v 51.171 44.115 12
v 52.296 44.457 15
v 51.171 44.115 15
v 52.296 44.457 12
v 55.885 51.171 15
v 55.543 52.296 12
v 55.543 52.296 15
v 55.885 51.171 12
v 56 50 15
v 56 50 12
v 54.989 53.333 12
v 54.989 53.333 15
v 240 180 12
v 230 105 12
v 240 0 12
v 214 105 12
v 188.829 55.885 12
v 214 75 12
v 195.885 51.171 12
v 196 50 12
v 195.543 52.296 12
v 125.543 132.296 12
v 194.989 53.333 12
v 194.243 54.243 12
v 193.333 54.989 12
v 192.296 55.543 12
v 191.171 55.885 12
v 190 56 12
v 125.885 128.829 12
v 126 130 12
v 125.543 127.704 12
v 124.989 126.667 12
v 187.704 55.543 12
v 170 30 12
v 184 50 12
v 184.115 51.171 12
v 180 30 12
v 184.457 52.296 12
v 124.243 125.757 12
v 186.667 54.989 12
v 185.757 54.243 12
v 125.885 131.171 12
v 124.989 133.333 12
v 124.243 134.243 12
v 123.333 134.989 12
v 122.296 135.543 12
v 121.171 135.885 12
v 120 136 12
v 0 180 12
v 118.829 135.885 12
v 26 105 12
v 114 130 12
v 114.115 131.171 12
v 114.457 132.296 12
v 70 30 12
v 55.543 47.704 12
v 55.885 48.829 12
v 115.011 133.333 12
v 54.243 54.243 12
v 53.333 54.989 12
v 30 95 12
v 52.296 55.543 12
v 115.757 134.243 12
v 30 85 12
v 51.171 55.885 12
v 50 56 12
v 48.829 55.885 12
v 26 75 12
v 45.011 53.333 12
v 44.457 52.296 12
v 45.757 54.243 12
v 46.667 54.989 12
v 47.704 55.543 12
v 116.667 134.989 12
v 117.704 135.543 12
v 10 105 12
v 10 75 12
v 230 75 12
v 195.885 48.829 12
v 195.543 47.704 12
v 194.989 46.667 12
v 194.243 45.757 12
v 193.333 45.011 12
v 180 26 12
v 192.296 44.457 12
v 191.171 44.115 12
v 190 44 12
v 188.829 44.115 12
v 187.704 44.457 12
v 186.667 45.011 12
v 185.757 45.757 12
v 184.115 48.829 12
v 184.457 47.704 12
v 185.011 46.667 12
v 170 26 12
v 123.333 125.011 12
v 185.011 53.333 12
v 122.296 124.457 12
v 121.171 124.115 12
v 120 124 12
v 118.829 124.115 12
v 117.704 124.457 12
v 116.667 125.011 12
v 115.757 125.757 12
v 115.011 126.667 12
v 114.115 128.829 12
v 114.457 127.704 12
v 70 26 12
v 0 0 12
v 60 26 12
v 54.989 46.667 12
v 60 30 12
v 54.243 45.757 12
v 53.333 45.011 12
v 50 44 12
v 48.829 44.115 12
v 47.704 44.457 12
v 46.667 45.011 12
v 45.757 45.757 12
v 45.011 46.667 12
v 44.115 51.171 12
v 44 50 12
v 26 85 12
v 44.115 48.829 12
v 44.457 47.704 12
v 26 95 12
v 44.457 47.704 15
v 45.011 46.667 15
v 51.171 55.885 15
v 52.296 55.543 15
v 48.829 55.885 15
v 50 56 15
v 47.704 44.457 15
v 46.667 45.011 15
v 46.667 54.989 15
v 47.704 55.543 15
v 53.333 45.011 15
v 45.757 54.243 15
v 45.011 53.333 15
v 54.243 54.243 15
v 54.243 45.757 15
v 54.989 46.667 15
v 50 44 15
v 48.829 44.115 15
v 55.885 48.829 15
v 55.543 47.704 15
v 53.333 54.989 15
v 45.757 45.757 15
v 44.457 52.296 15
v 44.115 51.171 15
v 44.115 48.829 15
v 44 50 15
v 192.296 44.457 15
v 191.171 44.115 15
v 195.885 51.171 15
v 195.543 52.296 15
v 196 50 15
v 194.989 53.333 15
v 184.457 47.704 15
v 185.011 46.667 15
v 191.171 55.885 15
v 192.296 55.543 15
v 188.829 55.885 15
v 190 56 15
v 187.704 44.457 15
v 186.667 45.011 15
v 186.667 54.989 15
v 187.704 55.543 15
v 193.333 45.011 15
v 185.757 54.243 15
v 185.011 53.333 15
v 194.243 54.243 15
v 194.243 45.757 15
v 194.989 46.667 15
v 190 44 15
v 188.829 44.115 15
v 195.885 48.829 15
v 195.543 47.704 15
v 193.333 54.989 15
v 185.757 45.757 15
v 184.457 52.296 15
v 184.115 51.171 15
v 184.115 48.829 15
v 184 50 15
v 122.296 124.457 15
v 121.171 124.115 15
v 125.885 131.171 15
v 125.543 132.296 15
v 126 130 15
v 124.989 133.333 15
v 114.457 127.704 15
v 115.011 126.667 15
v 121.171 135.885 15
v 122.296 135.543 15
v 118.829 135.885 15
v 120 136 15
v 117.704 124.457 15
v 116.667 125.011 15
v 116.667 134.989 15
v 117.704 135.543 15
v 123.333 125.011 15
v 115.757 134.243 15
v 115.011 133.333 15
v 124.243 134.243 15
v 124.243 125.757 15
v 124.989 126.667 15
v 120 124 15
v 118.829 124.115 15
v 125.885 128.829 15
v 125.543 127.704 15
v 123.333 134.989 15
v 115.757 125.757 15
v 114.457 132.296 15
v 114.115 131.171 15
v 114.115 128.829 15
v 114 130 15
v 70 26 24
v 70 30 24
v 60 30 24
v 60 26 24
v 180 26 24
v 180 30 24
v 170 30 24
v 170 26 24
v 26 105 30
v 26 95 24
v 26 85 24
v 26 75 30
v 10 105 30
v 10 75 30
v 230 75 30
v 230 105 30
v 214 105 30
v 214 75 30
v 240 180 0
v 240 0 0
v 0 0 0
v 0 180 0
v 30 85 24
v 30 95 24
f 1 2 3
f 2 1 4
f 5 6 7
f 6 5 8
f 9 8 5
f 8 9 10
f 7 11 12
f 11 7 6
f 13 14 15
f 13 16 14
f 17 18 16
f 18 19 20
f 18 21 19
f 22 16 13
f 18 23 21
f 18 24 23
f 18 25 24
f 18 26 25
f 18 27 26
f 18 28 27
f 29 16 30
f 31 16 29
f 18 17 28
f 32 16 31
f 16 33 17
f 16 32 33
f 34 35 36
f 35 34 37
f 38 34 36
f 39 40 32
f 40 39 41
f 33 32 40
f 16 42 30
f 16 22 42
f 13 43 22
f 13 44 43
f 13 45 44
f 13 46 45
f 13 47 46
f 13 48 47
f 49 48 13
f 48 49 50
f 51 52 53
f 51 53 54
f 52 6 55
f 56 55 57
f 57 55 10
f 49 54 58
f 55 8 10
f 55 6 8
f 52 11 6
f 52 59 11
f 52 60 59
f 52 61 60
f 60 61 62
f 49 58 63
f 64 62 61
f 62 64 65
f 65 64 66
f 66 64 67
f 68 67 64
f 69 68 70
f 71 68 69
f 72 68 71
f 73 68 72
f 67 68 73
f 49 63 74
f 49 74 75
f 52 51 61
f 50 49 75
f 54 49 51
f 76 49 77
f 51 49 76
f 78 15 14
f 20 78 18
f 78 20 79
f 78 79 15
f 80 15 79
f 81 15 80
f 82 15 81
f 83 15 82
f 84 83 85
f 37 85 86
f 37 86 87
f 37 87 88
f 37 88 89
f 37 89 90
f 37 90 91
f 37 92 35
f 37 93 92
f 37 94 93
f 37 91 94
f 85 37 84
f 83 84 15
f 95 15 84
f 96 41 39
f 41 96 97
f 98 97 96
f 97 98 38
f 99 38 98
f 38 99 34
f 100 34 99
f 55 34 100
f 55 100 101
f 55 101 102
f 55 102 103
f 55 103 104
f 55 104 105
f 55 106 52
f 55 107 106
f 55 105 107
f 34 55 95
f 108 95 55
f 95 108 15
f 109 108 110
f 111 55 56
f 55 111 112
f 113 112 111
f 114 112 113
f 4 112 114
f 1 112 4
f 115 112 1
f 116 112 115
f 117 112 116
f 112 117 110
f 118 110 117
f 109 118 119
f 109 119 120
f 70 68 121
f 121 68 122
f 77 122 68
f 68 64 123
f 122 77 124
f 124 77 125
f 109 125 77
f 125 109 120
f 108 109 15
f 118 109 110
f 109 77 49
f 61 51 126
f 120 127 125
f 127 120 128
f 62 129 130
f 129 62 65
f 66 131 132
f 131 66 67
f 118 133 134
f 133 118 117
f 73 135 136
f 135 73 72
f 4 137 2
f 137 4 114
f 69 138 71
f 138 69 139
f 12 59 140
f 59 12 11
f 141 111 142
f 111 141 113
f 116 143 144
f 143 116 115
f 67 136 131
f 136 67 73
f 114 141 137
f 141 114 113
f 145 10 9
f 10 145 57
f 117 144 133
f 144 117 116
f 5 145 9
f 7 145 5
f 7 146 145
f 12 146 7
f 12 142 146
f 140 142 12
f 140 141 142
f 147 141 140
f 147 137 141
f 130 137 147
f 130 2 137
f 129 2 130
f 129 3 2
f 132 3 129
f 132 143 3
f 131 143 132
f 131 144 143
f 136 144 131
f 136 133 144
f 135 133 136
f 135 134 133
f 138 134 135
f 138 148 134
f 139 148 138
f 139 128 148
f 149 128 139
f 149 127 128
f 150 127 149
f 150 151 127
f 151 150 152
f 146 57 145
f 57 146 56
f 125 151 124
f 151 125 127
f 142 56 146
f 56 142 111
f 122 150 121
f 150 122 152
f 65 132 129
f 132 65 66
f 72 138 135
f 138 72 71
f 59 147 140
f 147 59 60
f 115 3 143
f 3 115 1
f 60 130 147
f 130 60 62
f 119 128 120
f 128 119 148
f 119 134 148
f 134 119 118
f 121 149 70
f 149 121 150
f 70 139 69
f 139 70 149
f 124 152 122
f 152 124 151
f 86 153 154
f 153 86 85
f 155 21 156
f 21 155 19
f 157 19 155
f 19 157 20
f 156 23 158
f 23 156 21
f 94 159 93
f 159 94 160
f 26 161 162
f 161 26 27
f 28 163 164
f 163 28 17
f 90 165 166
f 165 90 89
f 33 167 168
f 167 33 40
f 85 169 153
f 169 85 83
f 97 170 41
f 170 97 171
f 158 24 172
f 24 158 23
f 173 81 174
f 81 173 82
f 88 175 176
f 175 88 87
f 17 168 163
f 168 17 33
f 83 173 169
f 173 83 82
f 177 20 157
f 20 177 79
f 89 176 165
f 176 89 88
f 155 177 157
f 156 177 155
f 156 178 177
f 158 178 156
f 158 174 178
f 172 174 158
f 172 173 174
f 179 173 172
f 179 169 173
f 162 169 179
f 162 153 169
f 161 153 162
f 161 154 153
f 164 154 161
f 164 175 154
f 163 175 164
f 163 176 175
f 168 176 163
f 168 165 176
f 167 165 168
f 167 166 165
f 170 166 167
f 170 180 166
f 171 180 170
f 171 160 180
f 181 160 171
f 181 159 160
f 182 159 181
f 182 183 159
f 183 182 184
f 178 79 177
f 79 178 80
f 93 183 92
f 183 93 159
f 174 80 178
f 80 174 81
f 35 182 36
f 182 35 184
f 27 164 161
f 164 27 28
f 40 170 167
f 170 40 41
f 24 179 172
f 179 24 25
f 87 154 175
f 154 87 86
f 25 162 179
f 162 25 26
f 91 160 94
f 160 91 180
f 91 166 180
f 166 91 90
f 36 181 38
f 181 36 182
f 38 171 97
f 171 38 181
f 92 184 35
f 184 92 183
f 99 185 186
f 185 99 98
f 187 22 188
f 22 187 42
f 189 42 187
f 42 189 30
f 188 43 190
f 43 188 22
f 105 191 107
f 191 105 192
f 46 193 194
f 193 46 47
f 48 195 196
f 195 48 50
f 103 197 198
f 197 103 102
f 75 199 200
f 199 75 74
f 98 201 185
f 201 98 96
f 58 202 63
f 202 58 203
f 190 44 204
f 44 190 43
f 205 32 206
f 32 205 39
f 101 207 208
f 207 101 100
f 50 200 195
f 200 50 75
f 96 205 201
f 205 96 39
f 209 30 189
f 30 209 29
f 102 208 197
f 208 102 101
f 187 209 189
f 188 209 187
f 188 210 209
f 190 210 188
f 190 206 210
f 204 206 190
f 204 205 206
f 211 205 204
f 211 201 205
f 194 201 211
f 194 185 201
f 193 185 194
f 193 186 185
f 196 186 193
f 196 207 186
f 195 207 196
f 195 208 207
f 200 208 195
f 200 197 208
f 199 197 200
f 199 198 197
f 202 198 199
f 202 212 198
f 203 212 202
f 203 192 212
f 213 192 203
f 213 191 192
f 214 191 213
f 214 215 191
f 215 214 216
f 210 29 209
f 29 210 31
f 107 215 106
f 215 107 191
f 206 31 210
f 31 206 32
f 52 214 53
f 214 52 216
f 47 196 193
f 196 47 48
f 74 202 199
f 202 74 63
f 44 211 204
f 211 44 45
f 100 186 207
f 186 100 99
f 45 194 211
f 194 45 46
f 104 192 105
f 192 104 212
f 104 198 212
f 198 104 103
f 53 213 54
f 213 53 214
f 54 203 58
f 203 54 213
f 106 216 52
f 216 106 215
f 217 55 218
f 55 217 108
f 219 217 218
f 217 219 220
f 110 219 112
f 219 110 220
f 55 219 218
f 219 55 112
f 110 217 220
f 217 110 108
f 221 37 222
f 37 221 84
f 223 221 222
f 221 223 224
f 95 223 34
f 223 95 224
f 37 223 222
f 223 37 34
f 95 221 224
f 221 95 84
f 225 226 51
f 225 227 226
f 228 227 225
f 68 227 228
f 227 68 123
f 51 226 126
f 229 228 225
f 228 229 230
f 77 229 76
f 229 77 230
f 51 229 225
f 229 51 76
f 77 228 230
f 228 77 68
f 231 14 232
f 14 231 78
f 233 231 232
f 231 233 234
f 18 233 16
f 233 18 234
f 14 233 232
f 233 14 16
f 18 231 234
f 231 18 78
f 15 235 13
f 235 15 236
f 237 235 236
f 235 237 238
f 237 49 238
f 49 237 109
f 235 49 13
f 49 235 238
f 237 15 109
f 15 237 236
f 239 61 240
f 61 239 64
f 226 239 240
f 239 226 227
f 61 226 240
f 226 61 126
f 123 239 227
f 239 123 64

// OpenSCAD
// Fixture concept, mm. Replaceable contacts; low-force virtual clamp blocks.
$fn=32;
color([.65,.72,.59])cube([240,180,12]);
// Datum A: support pads. B: two contacts on long edge. C: one short-edge stop.
for(p=[[50,50],[190,50],[120,130]])color([.4,.55,.35])translate([p[0],p[1],12])cylinder(h=3,d=12);
for(x=[65,175])color([.75,.48,.25])translate([x-5,26,12])cube([10,4,12]);
color([.75,.48,.25])translate([26,85,12])cube([4,10,12]);
// Adjustable opposed clamp concept. No real force or safety rating is specified.
for(x=[10,214])color([.7,.4,.2])translate([x,75,12])cube([16,30,18]);
